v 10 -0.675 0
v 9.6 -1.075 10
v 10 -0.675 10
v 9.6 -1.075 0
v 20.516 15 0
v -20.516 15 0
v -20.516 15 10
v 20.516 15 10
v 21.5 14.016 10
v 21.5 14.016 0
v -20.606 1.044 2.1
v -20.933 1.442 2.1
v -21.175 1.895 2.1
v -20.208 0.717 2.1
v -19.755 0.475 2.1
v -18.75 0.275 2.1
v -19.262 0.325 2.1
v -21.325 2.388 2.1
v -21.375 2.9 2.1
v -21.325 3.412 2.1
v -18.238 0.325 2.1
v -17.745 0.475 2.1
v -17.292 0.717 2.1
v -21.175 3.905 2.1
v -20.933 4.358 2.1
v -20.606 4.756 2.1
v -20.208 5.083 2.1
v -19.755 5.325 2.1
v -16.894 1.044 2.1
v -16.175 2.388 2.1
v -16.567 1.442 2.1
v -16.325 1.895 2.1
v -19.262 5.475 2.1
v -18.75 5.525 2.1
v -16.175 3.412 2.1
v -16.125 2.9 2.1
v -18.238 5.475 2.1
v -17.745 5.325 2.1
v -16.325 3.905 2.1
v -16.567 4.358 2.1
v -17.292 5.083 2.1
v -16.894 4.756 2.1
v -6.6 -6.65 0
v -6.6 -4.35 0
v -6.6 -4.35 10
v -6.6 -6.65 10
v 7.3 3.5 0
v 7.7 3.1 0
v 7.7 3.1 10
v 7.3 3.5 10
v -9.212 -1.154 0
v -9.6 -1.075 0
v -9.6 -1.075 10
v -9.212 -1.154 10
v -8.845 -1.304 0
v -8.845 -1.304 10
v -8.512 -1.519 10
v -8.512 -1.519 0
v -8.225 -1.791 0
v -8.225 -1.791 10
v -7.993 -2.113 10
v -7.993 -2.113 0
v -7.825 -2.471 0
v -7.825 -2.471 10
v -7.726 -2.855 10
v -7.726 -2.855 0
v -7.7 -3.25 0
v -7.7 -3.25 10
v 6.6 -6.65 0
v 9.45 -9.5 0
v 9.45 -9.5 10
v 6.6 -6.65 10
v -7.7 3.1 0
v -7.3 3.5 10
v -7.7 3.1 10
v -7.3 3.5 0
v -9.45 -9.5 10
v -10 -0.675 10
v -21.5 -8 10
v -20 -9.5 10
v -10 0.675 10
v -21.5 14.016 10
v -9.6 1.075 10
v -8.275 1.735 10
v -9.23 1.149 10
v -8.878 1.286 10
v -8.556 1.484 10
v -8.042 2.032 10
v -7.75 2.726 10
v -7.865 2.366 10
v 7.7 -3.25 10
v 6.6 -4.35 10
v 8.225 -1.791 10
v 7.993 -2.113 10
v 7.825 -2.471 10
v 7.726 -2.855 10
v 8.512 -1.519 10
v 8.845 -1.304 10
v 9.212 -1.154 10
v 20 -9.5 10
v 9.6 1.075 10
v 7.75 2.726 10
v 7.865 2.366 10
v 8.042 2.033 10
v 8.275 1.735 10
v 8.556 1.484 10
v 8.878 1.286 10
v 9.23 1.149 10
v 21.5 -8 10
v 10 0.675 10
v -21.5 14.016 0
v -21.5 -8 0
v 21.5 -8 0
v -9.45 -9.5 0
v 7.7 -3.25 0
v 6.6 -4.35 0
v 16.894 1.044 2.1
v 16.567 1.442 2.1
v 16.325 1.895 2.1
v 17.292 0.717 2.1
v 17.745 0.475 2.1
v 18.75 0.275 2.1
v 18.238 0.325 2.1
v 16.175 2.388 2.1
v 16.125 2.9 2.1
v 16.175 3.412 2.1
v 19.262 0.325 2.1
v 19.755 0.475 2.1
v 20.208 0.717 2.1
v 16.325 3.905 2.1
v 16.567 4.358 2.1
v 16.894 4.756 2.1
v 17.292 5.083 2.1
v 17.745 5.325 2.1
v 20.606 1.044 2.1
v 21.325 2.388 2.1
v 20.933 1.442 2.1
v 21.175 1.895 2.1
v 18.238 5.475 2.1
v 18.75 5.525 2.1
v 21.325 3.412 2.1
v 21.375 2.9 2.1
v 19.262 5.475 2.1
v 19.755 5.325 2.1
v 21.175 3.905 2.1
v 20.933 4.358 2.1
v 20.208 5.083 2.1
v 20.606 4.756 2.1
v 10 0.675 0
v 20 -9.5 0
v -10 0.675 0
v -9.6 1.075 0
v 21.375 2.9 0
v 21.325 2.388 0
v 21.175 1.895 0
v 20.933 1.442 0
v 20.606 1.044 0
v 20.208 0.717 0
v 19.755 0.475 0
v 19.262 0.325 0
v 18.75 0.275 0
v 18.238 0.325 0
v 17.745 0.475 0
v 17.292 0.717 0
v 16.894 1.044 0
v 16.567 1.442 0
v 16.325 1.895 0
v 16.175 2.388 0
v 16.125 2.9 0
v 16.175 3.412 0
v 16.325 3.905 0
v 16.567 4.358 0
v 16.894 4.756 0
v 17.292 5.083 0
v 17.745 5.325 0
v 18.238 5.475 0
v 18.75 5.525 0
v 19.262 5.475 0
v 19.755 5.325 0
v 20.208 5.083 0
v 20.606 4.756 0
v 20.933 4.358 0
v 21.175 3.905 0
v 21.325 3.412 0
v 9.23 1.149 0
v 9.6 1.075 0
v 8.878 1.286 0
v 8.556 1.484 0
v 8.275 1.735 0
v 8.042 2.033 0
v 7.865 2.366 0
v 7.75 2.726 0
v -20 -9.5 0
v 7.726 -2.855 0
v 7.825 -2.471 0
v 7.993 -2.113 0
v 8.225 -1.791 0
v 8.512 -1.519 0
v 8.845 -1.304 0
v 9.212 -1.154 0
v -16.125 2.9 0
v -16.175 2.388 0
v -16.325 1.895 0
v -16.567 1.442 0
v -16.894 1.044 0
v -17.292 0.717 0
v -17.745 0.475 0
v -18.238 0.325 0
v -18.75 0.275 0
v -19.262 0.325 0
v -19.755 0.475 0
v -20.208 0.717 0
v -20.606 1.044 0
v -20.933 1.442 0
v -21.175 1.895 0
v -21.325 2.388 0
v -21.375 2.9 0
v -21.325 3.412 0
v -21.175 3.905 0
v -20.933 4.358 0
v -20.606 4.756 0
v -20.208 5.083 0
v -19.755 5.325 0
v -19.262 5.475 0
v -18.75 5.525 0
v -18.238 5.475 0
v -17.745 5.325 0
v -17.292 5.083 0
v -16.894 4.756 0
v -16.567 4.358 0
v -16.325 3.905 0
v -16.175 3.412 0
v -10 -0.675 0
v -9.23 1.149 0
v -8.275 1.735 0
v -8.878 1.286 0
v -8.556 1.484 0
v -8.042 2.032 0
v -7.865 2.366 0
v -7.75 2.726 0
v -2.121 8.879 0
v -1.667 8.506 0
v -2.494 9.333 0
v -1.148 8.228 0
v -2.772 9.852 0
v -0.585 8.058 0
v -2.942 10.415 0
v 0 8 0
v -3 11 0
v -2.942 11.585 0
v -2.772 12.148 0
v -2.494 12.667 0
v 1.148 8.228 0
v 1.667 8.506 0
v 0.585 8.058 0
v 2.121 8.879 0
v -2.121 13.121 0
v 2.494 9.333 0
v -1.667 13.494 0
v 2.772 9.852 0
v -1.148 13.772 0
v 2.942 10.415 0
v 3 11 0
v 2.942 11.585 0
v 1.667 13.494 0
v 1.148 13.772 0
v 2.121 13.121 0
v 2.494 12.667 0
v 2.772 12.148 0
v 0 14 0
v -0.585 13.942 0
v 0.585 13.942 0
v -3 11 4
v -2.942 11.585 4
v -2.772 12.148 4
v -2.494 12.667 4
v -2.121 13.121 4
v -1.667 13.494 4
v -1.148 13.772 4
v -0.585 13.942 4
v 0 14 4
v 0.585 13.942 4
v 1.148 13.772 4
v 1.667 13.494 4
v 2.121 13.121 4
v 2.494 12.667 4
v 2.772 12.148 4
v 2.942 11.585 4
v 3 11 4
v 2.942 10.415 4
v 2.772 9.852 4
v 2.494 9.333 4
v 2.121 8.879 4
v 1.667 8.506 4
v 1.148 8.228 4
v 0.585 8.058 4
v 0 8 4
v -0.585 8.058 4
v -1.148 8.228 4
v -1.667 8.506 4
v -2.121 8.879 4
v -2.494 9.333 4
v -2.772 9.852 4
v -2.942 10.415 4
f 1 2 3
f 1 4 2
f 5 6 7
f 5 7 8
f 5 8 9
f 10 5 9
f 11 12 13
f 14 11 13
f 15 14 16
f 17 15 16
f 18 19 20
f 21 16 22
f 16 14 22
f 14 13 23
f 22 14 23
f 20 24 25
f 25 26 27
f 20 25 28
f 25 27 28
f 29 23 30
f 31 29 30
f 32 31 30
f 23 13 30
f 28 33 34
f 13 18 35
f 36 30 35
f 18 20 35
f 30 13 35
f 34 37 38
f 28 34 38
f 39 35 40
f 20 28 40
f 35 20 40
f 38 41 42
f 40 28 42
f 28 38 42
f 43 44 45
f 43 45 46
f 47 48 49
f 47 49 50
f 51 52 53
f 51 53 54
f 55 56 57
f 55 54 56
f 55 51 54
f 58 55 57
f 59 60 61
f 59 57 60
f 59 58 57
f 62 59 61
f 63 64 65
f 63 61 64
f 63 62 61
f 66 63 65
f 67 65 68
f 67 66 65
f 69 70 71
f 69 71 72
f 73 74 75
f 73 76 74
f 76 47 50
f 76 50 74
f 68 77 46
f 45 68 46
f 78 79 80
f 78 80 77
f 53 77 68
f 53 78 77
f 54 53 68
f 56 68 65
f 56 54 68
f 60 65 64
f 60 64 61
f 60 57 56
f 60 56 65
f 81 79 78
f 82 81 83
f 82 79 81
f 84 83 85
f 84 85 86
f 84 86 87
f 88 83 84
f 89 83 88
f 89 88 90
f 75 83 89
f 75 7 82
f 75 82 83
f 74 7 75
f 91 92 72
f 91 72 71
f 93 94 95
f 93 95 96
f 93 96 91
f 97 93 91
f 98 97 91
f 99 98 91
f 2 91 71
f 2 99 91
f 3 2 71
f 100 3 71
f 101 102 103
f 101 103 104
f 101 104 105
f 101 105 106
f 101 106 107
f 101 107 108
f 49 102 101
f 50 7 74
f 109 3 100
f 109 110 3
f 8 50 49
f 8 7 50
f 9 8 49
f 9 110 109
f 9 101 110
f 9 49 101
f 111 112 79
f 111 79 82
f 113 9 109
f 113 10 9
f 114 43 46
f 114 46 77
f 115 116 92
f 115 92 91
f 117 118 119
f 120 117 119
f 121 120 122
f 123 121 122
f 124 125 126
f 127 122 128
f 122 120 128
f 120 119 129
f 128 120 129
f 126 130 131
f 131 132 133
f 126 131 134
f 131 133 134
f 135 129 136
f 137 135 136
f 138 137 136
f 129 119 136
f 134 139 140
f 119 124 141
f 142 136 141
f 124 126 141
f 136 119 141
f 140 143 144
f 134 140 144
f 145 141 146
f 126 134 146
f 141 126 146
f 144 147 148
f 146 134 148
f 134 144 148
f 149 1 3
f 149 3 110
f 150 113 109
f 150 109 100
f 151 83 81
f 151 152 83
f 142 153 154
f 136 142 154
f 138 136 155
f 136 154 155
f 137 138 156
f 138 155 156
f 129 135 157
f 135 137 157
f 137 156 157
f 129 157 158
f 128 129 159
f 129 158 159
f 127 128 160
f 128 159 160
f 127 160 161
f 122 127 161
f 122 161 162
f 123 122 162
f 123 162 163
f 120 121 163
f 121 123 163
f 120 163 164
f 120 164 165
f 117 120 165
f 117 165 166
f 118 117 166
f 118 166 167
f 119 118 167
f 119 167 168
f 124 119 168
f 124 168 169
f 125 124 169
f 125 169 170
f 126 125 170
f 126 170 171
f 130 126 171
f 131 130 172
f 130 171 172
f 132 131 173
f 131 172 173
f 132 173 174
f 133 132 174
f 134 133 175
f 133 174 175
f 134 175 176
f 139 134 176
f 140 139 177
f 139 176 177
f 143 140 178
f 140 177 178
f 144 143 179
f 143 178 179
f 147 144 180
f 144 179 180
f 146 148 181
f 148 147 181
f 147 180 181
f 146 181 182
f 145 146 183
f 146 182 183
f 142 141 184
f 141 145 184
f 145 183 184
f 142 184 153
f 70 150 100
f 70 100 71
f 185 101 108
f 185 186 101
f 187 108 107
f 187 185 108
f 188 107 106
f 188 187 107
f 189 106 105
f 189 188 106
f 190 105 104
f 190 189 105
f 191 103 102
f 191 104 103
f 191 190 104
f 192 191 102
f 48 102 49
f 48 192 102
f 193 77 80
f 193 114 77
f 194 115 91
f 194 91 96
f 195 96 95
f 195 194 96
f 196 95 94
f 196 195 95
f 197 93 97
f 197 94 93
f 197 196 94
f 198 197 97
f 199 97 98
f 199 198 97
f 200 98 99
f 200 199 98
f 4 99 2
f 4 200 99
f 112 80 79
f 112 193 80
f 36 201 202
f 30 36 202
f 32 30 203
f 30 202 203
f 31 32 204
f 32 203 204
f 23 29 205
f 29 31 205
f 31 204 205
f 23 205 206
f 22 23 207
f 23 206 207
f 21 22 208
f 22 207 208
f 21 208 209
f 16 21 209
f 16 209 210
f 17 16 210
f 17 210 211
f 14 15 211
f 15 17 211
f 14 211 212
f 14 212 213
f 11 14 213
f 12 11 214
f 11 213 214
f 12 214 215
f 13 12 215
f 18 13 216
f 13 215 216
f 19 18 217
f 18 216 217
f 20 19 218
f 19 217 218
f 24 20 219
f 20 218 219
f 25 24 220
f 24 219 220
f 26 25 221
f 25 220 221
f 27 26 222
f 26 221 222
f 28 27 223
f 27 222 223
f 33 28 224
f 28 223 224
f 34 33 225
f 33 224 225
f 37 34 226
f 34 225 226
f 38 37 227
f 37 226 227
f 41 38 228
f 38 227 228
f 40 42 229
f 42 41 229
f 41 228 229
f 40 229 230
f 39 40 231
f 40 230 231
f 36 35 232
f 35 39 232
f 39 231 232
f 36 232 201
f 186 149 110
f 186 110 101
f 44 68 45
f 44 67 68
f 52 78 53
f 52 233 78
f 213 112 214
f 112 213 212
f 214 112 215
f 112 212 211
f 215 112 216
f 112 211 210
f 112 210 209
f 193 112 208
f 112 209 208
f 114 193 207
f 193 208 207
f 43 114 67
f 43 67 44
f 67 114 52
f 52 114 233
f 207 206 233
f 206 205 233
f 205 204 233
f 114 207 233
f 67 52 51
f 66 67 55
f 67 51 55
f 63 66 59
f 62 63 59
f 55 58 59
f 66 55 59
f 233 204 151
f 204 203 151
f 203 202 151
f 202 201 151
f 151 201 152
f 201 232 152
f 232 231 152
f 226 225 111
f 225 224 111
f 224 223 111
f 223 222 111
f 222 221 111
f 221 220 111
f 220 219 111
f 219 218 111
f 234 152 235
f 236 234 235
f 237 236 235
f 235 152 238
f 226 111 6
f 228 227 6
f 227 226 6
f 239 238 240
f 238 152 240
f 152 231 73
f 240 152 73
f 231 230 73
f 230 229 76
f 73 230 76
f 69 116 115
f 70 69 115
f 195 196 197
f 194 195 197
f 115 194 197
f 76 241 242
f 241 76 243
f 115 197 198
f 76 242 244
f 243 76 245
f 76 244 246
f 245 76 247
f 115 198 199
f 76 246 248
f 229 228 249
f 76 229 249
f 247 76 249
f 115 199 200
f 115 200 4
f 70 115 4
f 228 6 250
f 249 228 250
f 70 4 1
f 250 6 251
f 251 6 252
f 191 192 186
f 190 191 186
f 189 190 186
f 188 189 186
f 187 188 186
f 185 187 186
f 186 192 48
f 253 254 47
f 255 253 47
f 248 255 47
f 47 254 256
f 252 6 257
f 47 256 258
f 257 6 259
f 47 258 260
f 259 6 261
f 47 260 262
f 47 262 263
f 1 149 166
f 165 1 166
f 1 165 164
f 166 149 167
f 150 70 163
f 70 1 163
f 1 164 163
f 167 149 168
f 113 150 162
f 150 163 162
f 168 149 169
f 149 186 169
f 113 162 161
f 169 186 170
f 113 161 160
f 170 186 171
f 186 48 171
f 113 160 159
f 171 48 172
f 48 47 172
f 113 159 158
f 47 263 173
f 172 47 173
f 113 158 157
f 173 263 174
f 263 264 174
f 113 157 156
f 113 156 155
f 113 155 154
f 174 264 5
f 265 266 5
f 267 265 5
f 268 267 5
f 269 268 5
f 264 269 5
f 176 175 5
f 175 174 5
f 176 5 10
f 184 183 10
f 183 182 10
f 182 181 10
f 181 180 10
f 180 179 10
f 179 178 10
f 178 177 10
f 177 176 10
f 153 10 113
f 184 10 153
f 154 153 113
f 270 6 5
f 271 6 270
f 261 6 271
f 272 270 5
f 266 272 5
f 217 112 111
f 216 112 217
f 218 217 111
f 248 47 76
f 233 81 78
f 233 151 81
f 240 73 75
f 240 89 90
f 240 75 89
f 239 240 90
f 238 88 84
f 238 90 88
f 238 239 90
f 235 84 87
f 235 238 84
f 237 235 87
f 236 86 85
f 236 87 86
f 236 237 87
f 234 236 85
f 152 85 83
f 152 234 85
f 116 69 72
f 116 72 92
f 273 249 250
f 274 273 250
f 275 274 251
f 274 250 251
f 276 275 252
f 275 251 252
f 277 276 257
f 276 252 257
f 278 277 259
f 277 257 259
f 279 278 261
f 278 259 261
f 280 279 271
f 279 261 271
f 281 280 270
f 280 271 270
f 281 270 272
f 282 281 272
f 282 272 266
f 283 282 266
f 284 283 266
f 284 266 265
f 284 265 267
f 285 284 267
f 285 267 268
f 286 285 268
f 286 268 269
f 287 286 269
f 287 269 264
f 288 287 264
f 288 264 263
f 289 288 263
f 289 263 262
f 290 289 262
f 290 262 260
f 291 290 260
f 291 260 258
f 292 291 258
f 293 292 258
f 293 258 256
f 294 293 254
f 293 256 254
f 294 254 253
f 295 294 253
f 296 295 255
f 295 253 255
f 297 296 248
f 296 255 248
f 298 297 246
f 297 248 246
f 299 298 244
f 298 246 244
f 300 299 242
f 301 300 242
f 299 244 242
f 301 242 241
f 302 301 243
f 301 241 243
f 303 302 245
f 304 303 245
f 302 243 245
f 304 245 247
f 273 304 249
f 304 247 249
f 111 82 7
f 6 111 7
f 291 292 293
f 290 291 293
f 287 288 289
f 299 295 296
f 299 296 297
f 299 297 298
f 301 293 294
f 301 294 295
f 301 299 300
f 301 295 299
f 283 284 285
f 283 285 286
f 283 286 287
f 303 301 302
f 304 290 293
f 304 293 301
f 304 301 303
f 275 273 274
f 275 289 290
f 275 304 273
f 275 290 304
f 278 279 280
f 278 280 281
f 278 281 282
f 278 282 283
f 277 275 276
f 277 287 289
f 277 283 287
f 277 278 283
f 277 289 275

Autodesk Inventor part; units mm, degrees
ref_plane "YZ Plane" through (0, 0, 0) normal (1, 0, 0) x (0, 1, 0)
ref_plane "XZ Plane" through (0, 0, 0) normal (0, 1, 0) x (-1, 0, 0)
ref_plane "XY Plane" through (0, 0, 0) normal (0, 0, 1) x (1, 0, 0)
sketch "Sketch1" plane through (0, 0, 0) normal (0, 0, 1) x (1, 0, 0)
  line L0 (20.5165, 15) -> (21.5, 14.0165)
  line L1 (-20.5165, 15) -> (20.5165, 15)
  line L2 (-21.5, 14.0165) -> (-20.5165, 15)
  line L3 (-21.5, -8) -> (-21.5, 14.0165)
  line L4 (-20, -9.5) -> (-21.5, -8)
  line L5 (-9.45, -9.5) -> (-20, -9.5)
  line L6 (-6.6, -6.65) -> (-9.45, -9.5)
  line L7 (-6.6, -4.35) -> (-6.6, -6.65)
  line L8 (-7.7, -3.25) -> (-6.6, -4.35)
  arc A0 (-7.7, -3.25) -> (-9.6, -1.075) centre (-9.8292, -3.1926) ccw
  line L9 (-10, -0.675) -> (-9.6, -1.075)
  line L10 (-10, 0.675) -> (-10, -0.675)
  line L11 (-9.6, 1.075) -> (-10, 0.675)
  arc A1 (-9.6, 1.075) -> (-7.7, 3.1) centre (-9.828, 3.1928) ccw
  line L12 (-7.3, 3.5) -> (-7.7, 3.1)
  line L13 (7.3, 3.5) -> (-7.3, 3.5)
  line L14 (7.7, 3.1) -> (7.3, 3.5)
  arc A2 (7.7, 3.1) -> (9.6, 1.075) centre (9.828, 3.1928) ccw
  line L15 (10, 0.675) -> (9.6, 1.075)
  line L16 (10, -0.675) -> (10, 0.675)
  line L17 (9.6, -1.075) -> (10, -0.675)
  arc A3 (9.6, -1.075) -> (7.7, -3.25) centre (9.8292, -3.1926) ccw
  line L18 (6.6, -4.35) -> (7.7, -3.25)
  line L19 (6.6, -6.65) -> (6.6, -4.35)
  line L20 (9.45, -9.5) -> (6.6, -6.65)
  line L21 (20, -9.5) -> (9.45, -9.5)
  line L22 (21.5, -8) -> (20, -9.5)
  line L23 (21.5, 14.0165) -> (21.5, -8)
  circle A4 centre (-18.75, 2.9) radius 2.625
  circle A5 centre (18.75, 2.9) radius 2.625
  point P0 (0, 0)
  point P1 (0, 0)
extrude "Extrusion1" add sketch "Sketch1" along normal blind 10 contours L0 L23 L22 L21 L20 L19 L18 A3 L17 L16 L15 A2 L14 L13 L12 A1 L11 L10 L9 A0 L8 L7 L6 L5 L4 L3 L2 L1 | A4 | A5
extrude "Extrusion2" cut sketch "Sketch1" along normal blind 2.1 contours A4 | A5
sketch "Sketch2" plane through (0, 0, 0) normal (0, 0, -1) x (-1, 0, 0)
  circle A0 centre (18.75, 2.9) radius 2.625 projected
  circle A1 centre (-18.75, 2.9) radius 2.625 projected
  line L0 (-7.7, -3.25) -> (-6.6, -4.35) projected
  arc A2 (-7.7, -3.25) -> (-9.6, -1.075) centre (-9.8292, -3.1926) ccw projected
  line L1 (-10, -0.675) -> (-9.6, -1.075) projected
  line L2 (-10, 0.675) -> (-10, -0.675) projected
  line L3 (-9.6, 1.075) -> (-10, 0.675) projected
  arc A3 (-9.6, 1.075) -> (-7.7, 3.1) centre (-9.828, 3.1928) ccw projected
  line L4 (-7.3, 3.5) -> (-7.7, 3.1) projected
  line L5 (7.3, 3.5) -> (-7.3, 3.5) projected
  line L6 (7.7, 3.1) -> (7.3, 3.5) projected
  arc A4 (7.7, 3.1) -> (9.6, 1.075) centre (9.828, 3.1928) ccw projected
  line L7 (10, 0.675) -> (9.6, 1.075) projected
  line L8 (10, -0.675) -> (10, 0.675) projected
  line L9 (9.6, -1.075) -> (10, -0.675) projected
  arc A5 (9.6, -1.075) -> (7.7, -3.25) centre (9.8292, -3.1926) ccw projected
  line L10 (6.6, -4.35) -> (7.7, -3.25) projected
  line L11 (6.6, -6.65) -> (6.6, -4.35) projected
  line L12 (9.45, -9.5) -> (6.6, -6.65) projected
  line L13 (20, -9.5) -> (9.45, -9.5) projected
  line L14 (21.5, -8) -> (20, -9.5) projected
  line L15 (21.5, 14.0165) -> (21.5, -8) projected
  line L16 (20.5165, 15) -> (21.5, 14.0165) projected
  line L17 (-20.5165, 15) -> (20.5165, 15) projected
  line L18 (-21.5, 14.0165) -> (-20.5165, 15) projected
  line L19 (-21.5, -8) -> (-21.5, 14.0165) projected
  line L20 (-20, -9.5) -> (-21.5, -8) projected
  line L21 (-9.45, -9.5) -> (-20, -9.5) projected
  line L22 (-6.6, -6.65) -> (-9.45, -9.5) projected
  line L23 (-6.6, -4.35) -> (-6.6, -6.65) projected
  circle A6 centre (0, 11) radius 3
  point P0 (0, 0)
  point P1 (0, 0)
extrude "Extrusion3" cut sketch "Sketch2" against normal blind 4 contours A6
properties part number "HGR20C"
